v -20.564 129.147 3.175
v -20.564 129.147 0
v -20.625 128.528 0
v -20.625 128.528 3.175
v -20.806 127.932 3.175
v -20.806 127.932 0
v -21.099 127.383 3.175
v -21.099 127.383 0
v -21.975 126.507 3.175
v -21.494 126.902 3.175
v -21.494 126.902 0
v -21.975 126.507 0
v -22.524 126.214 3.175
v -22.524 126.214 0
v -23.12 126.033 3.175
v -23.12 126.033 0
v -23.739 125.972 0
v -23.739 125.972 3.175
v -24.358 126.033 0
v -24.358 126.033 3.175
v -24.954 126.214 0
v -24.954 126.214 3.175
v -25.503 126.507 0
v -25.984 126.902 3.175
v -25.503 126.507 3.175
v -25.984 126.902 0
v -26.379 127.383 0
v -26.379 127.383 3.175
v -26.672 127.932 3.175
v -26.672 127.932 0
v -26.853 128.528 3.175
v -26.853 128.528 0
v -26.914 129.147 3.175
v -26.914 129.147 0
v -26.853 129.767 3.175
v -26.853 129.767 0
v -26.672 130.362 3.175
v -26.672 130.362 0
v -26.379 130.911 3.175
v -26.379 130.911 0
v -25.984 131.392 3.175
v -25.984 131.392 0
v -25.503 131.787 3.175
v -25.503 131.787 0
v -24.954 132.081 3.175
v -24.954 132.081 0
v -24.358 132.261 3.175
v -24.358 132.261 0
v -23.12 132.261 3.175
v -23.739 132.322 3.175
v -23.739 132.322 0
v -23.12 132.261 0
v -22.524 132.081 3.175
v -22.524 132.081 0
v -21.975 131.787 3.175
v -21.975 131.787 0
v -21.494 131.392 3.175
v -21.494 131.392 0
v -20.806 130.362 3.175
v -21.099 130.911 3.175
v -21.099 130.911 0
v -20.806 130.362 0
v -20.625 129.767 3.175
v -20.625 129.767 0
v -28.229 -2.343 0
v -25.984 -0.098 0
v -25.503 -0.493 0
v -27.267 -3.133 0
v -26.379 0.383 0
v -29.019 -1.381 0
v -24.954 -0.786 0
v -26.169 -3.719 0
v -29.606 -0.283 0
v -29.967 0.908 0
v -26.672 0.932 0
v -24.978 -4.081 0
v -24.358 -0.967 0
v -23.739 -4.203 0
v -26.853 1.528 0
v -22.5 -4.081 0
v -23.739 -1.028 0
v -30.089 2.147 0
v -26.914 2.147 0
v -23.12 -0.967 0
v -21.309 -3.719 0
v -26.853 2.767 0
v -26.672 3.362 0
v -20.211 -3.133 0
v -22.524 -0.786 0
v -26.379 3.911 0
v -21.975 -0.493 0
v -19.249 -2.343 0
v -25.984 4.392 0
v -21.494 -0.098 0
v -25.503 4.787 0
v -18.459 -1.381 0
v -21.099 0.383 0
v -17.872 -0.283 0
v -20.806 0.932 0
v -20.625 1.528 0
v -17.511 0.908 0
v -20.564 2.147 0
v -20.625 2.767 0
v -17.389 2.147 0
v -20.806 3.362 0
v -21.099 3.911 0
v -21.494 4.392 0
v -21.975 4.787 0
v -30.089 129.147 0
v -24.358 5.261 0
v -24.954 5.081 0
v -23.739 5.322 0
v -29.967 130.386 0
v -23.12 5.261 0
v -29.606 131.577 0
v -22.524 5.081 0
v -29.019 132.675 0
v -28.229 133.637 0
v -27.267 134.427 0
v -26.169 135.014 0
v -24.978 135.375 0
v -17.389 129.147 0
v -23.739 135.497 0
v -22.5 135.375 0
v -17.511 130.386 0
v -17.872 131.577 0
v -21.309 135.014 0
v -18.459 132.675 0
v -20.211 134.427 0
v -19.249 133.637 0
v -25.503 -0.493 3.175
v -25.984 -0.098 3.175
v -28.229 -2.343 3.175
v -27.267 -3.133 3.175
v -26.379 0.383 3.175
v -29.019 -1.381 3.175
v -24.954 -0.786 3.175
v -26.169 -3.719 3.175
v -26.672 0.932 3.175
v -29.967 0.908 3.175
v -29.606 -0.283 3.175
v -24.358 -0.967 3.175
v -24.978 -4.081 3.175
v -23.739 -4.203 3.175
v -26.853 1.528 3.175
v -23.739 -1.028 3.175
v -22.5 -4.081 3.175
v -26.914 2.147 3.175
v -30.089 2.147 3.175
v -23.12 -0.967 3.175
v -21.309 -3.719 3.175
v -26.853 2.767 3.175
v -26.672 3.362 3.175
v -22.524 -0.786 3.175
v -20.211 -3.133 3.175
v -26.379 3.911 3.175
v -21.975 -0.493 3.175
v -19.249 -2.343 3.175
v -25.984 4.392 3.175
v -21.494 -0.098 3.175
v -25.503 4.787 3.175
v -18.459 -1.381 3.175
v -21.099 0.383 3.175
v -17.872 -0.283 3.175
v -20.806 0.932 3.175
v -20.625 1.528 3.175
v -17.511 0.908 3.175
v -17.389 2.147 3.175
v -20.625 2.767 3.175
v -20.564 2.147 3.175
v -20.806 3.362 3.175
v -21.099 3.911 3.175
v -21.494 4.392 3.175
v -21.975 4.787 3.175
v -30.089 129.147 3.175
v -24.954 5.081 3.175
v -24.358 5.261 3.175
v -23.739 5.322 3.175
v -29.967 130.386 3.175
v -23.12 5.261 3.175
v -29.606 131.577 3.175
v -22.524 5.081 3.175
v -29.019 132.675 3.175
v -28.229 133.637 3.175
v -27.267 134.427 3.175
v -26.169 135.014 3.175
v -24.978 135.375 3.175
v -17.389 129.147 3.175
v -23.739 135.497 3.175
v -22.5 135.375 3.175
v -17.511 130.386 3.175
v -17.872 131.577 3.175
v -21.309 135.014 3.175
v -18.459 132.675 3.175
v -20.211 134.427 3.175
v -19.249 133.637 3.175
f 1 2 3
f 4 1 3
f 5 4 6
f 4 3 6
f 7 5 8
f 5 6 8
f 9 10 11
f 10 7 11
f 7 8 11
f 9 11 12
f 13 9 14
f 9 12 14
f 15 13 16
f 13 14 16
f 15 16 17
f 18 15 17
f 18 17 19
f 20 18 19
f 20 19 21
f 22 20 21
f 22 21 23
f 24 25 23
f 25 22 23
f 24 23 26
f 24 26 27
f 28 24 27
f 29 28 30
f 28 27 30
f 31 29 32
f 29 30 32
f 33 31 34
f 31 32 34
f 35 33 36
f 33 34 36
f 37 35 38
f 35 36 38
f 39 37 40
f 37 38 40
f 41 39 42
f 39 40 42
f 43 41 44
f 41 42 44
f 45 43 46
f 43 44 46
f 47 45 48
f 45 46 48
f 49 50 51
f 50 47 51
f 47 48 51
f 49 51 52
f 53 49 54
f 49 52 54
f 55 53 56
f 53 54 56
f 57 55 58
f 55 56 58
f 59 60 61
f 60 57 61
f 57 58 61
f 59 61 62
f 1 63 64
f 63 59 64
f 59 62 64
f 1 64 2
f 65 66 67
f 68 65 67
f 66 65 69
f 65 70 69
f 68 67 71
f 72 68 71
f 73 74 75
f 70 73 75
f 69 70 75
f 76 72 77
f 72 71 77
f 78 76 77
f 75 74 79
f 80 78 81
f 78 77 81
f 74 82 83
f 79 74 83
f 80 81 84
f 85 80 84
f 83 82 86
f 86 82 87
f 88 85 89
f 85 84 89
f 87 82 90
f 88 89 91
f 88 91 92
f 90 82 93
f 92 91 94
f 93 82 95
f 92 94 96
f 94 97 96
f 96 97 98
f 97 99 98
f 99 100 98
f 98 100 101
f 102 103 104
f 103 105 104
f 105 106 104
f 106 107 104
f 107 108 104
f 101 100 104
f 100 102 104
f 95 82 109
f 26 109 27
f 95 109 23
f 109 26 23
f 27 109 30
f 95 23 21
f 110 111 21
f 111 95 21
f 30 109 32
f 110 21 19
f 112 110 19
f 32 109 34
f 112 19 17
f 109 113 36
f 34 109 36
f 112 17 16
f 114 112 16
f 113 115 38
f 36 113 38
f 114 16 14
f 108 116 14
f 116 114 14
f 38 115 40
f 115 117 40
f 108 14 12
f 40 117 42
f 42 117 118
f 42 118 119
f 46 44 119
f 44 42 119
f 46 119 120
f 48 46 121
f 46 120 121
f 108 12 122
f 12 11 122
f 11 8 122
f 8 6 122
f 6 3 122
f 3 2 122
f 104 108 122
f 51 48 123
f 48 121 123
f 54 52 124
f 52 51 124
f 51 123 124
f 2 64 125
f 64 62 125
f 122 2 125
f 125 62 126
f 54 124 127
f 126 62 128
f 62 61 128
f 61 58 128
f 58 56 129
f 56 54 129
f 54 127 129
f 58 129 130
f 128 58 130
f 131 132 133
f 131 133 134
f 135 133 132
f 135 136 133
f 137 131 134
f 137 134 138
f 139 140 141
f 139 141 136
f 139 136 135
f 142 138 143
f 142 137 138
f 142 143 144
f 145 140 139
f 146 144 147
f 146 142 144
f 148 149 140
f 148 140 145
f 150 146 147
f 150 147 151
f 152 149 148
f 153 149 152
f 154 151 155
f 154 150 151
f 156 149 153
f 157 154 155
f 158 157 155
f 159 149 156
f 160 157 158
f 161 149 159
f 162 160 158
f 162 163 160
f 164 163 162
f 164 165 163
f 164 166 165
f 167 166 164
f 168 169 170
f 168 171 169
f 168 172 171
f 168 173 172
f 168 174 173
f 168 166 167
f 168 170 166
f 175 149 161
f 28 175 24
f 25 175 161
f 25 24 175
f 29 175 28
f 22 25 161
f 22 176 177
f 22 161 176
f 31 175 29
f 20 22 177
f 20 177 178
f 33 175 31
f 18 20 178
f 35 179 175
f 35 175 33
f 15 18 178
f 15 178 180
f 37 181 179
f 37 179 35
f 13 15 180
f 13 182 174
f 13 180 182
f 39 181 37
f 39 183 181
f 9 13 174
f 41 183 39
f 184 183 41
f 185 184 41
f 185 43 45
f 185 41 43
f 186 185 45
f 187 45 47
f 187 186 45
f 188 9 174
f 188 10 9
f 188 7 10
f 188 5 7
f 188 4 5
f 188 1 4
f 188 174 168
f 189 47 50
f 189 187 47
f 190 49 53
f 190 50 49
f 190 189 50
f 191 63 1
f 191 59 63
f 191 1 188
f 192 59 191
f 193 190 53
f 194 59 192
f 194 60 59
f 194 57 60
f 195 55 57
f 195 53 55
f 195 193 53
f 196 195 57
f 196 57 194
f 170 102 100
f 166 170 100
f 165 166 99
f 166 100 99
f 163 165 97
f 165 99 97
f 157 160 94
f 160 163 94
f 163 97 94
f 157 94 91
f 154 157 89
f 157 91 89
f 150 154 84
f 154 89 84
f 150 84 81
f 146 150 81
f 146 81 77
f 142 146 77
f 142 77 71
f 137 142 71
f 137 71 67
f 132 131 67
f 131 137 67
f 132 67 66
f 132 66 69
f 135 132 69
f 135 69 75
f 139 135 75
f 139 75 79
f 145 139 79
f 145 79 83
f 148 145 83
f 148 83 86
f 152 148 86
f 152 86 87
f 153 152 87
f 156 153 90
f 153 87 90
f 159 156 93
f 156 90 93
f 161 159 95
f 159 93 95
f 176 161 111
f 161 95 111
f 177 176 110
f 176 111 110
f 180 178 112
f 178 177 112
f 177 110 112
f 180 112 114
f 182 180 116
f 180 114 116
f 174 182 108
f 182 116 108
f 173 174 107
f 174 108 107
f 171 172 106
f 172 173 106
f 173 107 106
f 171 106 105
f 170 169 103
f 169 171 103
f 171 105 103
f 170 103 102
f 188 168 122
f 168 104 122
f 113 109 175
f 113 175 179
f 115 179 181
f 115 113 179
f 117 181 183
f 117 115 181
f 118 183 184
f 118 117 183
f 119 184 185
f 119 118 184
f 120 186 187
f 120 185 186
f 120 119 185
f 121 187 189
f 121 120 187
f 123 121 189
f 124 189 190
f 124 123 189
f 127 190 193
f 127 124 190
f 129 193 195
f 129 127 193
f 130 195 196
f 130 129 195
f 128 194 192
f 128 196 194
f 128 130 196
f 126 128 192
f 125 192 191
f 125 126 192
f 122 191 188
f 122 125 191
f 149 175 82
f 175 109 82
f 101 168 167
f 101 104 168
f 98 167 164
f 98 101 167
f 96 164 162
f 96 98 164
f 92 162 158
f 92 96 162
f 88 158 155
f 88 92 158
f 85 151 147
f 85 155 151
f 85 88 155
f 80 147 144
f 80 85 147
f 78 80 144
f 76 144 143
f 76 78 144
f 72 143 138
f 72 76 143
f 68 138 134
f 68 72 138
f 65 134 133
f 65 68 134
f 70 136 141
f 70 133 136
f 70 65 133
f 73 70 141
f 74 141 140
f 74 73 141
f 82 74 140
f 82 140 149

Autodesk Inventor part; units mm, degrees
ref_plane "YZ Plane" through (0, 0, 0) normal (1, 0, 0) x (0, 1, 0)
ref_plane "XZ Plane" through (0, 0, 0) normal (0, 1, 0) x (-1, 0, 0)
ref_plane "XY Plane" through (0, 0, 0) normal (0, 0, 1) x (1, 0, 0)
sketch "Sketch1" plane through (0, 0, 0) normal (0, 0, 1) x (1, 0, 0)
  line L0 (-23.739, 2.1473) -> (-23.739, 129.1473) construction
  line L1 (-17.389, 2.1473) -> (-17.389, 129.1473)
  line L2 (-30.089, 129.1473) -> (-30.089, 2.1473)
  arc A0 (-30.089, 2.1473) -> (-17.389, 2.1473) centre (-23.739, 2.1473) ccw
  arc A1 (-17.389, 129.1473) -> (-30.089, 129.1473) centre (-23.739, 129.1473) ccw
  circle A2 centre (-23.739, 129.1473) radius 3.175
  circle A3 centre (-23.739, 2.1473) radius 3.175
  circle A4 centre (0, 0) radius 3.175 construction
  point P0 (-23.739, 65.6473)
  dimension "d0" = 127
  dimension "d1" = 12.7
  dimension "d2" = 6.35
  dimension "d3" = 6.35
  dimension "d4" = 6.35
extrude "Extrusion1" add sketch "Sketch1" along normal blind 3.175
equation "\"d3\" = d2"
equation "\"d4\" = d2"
